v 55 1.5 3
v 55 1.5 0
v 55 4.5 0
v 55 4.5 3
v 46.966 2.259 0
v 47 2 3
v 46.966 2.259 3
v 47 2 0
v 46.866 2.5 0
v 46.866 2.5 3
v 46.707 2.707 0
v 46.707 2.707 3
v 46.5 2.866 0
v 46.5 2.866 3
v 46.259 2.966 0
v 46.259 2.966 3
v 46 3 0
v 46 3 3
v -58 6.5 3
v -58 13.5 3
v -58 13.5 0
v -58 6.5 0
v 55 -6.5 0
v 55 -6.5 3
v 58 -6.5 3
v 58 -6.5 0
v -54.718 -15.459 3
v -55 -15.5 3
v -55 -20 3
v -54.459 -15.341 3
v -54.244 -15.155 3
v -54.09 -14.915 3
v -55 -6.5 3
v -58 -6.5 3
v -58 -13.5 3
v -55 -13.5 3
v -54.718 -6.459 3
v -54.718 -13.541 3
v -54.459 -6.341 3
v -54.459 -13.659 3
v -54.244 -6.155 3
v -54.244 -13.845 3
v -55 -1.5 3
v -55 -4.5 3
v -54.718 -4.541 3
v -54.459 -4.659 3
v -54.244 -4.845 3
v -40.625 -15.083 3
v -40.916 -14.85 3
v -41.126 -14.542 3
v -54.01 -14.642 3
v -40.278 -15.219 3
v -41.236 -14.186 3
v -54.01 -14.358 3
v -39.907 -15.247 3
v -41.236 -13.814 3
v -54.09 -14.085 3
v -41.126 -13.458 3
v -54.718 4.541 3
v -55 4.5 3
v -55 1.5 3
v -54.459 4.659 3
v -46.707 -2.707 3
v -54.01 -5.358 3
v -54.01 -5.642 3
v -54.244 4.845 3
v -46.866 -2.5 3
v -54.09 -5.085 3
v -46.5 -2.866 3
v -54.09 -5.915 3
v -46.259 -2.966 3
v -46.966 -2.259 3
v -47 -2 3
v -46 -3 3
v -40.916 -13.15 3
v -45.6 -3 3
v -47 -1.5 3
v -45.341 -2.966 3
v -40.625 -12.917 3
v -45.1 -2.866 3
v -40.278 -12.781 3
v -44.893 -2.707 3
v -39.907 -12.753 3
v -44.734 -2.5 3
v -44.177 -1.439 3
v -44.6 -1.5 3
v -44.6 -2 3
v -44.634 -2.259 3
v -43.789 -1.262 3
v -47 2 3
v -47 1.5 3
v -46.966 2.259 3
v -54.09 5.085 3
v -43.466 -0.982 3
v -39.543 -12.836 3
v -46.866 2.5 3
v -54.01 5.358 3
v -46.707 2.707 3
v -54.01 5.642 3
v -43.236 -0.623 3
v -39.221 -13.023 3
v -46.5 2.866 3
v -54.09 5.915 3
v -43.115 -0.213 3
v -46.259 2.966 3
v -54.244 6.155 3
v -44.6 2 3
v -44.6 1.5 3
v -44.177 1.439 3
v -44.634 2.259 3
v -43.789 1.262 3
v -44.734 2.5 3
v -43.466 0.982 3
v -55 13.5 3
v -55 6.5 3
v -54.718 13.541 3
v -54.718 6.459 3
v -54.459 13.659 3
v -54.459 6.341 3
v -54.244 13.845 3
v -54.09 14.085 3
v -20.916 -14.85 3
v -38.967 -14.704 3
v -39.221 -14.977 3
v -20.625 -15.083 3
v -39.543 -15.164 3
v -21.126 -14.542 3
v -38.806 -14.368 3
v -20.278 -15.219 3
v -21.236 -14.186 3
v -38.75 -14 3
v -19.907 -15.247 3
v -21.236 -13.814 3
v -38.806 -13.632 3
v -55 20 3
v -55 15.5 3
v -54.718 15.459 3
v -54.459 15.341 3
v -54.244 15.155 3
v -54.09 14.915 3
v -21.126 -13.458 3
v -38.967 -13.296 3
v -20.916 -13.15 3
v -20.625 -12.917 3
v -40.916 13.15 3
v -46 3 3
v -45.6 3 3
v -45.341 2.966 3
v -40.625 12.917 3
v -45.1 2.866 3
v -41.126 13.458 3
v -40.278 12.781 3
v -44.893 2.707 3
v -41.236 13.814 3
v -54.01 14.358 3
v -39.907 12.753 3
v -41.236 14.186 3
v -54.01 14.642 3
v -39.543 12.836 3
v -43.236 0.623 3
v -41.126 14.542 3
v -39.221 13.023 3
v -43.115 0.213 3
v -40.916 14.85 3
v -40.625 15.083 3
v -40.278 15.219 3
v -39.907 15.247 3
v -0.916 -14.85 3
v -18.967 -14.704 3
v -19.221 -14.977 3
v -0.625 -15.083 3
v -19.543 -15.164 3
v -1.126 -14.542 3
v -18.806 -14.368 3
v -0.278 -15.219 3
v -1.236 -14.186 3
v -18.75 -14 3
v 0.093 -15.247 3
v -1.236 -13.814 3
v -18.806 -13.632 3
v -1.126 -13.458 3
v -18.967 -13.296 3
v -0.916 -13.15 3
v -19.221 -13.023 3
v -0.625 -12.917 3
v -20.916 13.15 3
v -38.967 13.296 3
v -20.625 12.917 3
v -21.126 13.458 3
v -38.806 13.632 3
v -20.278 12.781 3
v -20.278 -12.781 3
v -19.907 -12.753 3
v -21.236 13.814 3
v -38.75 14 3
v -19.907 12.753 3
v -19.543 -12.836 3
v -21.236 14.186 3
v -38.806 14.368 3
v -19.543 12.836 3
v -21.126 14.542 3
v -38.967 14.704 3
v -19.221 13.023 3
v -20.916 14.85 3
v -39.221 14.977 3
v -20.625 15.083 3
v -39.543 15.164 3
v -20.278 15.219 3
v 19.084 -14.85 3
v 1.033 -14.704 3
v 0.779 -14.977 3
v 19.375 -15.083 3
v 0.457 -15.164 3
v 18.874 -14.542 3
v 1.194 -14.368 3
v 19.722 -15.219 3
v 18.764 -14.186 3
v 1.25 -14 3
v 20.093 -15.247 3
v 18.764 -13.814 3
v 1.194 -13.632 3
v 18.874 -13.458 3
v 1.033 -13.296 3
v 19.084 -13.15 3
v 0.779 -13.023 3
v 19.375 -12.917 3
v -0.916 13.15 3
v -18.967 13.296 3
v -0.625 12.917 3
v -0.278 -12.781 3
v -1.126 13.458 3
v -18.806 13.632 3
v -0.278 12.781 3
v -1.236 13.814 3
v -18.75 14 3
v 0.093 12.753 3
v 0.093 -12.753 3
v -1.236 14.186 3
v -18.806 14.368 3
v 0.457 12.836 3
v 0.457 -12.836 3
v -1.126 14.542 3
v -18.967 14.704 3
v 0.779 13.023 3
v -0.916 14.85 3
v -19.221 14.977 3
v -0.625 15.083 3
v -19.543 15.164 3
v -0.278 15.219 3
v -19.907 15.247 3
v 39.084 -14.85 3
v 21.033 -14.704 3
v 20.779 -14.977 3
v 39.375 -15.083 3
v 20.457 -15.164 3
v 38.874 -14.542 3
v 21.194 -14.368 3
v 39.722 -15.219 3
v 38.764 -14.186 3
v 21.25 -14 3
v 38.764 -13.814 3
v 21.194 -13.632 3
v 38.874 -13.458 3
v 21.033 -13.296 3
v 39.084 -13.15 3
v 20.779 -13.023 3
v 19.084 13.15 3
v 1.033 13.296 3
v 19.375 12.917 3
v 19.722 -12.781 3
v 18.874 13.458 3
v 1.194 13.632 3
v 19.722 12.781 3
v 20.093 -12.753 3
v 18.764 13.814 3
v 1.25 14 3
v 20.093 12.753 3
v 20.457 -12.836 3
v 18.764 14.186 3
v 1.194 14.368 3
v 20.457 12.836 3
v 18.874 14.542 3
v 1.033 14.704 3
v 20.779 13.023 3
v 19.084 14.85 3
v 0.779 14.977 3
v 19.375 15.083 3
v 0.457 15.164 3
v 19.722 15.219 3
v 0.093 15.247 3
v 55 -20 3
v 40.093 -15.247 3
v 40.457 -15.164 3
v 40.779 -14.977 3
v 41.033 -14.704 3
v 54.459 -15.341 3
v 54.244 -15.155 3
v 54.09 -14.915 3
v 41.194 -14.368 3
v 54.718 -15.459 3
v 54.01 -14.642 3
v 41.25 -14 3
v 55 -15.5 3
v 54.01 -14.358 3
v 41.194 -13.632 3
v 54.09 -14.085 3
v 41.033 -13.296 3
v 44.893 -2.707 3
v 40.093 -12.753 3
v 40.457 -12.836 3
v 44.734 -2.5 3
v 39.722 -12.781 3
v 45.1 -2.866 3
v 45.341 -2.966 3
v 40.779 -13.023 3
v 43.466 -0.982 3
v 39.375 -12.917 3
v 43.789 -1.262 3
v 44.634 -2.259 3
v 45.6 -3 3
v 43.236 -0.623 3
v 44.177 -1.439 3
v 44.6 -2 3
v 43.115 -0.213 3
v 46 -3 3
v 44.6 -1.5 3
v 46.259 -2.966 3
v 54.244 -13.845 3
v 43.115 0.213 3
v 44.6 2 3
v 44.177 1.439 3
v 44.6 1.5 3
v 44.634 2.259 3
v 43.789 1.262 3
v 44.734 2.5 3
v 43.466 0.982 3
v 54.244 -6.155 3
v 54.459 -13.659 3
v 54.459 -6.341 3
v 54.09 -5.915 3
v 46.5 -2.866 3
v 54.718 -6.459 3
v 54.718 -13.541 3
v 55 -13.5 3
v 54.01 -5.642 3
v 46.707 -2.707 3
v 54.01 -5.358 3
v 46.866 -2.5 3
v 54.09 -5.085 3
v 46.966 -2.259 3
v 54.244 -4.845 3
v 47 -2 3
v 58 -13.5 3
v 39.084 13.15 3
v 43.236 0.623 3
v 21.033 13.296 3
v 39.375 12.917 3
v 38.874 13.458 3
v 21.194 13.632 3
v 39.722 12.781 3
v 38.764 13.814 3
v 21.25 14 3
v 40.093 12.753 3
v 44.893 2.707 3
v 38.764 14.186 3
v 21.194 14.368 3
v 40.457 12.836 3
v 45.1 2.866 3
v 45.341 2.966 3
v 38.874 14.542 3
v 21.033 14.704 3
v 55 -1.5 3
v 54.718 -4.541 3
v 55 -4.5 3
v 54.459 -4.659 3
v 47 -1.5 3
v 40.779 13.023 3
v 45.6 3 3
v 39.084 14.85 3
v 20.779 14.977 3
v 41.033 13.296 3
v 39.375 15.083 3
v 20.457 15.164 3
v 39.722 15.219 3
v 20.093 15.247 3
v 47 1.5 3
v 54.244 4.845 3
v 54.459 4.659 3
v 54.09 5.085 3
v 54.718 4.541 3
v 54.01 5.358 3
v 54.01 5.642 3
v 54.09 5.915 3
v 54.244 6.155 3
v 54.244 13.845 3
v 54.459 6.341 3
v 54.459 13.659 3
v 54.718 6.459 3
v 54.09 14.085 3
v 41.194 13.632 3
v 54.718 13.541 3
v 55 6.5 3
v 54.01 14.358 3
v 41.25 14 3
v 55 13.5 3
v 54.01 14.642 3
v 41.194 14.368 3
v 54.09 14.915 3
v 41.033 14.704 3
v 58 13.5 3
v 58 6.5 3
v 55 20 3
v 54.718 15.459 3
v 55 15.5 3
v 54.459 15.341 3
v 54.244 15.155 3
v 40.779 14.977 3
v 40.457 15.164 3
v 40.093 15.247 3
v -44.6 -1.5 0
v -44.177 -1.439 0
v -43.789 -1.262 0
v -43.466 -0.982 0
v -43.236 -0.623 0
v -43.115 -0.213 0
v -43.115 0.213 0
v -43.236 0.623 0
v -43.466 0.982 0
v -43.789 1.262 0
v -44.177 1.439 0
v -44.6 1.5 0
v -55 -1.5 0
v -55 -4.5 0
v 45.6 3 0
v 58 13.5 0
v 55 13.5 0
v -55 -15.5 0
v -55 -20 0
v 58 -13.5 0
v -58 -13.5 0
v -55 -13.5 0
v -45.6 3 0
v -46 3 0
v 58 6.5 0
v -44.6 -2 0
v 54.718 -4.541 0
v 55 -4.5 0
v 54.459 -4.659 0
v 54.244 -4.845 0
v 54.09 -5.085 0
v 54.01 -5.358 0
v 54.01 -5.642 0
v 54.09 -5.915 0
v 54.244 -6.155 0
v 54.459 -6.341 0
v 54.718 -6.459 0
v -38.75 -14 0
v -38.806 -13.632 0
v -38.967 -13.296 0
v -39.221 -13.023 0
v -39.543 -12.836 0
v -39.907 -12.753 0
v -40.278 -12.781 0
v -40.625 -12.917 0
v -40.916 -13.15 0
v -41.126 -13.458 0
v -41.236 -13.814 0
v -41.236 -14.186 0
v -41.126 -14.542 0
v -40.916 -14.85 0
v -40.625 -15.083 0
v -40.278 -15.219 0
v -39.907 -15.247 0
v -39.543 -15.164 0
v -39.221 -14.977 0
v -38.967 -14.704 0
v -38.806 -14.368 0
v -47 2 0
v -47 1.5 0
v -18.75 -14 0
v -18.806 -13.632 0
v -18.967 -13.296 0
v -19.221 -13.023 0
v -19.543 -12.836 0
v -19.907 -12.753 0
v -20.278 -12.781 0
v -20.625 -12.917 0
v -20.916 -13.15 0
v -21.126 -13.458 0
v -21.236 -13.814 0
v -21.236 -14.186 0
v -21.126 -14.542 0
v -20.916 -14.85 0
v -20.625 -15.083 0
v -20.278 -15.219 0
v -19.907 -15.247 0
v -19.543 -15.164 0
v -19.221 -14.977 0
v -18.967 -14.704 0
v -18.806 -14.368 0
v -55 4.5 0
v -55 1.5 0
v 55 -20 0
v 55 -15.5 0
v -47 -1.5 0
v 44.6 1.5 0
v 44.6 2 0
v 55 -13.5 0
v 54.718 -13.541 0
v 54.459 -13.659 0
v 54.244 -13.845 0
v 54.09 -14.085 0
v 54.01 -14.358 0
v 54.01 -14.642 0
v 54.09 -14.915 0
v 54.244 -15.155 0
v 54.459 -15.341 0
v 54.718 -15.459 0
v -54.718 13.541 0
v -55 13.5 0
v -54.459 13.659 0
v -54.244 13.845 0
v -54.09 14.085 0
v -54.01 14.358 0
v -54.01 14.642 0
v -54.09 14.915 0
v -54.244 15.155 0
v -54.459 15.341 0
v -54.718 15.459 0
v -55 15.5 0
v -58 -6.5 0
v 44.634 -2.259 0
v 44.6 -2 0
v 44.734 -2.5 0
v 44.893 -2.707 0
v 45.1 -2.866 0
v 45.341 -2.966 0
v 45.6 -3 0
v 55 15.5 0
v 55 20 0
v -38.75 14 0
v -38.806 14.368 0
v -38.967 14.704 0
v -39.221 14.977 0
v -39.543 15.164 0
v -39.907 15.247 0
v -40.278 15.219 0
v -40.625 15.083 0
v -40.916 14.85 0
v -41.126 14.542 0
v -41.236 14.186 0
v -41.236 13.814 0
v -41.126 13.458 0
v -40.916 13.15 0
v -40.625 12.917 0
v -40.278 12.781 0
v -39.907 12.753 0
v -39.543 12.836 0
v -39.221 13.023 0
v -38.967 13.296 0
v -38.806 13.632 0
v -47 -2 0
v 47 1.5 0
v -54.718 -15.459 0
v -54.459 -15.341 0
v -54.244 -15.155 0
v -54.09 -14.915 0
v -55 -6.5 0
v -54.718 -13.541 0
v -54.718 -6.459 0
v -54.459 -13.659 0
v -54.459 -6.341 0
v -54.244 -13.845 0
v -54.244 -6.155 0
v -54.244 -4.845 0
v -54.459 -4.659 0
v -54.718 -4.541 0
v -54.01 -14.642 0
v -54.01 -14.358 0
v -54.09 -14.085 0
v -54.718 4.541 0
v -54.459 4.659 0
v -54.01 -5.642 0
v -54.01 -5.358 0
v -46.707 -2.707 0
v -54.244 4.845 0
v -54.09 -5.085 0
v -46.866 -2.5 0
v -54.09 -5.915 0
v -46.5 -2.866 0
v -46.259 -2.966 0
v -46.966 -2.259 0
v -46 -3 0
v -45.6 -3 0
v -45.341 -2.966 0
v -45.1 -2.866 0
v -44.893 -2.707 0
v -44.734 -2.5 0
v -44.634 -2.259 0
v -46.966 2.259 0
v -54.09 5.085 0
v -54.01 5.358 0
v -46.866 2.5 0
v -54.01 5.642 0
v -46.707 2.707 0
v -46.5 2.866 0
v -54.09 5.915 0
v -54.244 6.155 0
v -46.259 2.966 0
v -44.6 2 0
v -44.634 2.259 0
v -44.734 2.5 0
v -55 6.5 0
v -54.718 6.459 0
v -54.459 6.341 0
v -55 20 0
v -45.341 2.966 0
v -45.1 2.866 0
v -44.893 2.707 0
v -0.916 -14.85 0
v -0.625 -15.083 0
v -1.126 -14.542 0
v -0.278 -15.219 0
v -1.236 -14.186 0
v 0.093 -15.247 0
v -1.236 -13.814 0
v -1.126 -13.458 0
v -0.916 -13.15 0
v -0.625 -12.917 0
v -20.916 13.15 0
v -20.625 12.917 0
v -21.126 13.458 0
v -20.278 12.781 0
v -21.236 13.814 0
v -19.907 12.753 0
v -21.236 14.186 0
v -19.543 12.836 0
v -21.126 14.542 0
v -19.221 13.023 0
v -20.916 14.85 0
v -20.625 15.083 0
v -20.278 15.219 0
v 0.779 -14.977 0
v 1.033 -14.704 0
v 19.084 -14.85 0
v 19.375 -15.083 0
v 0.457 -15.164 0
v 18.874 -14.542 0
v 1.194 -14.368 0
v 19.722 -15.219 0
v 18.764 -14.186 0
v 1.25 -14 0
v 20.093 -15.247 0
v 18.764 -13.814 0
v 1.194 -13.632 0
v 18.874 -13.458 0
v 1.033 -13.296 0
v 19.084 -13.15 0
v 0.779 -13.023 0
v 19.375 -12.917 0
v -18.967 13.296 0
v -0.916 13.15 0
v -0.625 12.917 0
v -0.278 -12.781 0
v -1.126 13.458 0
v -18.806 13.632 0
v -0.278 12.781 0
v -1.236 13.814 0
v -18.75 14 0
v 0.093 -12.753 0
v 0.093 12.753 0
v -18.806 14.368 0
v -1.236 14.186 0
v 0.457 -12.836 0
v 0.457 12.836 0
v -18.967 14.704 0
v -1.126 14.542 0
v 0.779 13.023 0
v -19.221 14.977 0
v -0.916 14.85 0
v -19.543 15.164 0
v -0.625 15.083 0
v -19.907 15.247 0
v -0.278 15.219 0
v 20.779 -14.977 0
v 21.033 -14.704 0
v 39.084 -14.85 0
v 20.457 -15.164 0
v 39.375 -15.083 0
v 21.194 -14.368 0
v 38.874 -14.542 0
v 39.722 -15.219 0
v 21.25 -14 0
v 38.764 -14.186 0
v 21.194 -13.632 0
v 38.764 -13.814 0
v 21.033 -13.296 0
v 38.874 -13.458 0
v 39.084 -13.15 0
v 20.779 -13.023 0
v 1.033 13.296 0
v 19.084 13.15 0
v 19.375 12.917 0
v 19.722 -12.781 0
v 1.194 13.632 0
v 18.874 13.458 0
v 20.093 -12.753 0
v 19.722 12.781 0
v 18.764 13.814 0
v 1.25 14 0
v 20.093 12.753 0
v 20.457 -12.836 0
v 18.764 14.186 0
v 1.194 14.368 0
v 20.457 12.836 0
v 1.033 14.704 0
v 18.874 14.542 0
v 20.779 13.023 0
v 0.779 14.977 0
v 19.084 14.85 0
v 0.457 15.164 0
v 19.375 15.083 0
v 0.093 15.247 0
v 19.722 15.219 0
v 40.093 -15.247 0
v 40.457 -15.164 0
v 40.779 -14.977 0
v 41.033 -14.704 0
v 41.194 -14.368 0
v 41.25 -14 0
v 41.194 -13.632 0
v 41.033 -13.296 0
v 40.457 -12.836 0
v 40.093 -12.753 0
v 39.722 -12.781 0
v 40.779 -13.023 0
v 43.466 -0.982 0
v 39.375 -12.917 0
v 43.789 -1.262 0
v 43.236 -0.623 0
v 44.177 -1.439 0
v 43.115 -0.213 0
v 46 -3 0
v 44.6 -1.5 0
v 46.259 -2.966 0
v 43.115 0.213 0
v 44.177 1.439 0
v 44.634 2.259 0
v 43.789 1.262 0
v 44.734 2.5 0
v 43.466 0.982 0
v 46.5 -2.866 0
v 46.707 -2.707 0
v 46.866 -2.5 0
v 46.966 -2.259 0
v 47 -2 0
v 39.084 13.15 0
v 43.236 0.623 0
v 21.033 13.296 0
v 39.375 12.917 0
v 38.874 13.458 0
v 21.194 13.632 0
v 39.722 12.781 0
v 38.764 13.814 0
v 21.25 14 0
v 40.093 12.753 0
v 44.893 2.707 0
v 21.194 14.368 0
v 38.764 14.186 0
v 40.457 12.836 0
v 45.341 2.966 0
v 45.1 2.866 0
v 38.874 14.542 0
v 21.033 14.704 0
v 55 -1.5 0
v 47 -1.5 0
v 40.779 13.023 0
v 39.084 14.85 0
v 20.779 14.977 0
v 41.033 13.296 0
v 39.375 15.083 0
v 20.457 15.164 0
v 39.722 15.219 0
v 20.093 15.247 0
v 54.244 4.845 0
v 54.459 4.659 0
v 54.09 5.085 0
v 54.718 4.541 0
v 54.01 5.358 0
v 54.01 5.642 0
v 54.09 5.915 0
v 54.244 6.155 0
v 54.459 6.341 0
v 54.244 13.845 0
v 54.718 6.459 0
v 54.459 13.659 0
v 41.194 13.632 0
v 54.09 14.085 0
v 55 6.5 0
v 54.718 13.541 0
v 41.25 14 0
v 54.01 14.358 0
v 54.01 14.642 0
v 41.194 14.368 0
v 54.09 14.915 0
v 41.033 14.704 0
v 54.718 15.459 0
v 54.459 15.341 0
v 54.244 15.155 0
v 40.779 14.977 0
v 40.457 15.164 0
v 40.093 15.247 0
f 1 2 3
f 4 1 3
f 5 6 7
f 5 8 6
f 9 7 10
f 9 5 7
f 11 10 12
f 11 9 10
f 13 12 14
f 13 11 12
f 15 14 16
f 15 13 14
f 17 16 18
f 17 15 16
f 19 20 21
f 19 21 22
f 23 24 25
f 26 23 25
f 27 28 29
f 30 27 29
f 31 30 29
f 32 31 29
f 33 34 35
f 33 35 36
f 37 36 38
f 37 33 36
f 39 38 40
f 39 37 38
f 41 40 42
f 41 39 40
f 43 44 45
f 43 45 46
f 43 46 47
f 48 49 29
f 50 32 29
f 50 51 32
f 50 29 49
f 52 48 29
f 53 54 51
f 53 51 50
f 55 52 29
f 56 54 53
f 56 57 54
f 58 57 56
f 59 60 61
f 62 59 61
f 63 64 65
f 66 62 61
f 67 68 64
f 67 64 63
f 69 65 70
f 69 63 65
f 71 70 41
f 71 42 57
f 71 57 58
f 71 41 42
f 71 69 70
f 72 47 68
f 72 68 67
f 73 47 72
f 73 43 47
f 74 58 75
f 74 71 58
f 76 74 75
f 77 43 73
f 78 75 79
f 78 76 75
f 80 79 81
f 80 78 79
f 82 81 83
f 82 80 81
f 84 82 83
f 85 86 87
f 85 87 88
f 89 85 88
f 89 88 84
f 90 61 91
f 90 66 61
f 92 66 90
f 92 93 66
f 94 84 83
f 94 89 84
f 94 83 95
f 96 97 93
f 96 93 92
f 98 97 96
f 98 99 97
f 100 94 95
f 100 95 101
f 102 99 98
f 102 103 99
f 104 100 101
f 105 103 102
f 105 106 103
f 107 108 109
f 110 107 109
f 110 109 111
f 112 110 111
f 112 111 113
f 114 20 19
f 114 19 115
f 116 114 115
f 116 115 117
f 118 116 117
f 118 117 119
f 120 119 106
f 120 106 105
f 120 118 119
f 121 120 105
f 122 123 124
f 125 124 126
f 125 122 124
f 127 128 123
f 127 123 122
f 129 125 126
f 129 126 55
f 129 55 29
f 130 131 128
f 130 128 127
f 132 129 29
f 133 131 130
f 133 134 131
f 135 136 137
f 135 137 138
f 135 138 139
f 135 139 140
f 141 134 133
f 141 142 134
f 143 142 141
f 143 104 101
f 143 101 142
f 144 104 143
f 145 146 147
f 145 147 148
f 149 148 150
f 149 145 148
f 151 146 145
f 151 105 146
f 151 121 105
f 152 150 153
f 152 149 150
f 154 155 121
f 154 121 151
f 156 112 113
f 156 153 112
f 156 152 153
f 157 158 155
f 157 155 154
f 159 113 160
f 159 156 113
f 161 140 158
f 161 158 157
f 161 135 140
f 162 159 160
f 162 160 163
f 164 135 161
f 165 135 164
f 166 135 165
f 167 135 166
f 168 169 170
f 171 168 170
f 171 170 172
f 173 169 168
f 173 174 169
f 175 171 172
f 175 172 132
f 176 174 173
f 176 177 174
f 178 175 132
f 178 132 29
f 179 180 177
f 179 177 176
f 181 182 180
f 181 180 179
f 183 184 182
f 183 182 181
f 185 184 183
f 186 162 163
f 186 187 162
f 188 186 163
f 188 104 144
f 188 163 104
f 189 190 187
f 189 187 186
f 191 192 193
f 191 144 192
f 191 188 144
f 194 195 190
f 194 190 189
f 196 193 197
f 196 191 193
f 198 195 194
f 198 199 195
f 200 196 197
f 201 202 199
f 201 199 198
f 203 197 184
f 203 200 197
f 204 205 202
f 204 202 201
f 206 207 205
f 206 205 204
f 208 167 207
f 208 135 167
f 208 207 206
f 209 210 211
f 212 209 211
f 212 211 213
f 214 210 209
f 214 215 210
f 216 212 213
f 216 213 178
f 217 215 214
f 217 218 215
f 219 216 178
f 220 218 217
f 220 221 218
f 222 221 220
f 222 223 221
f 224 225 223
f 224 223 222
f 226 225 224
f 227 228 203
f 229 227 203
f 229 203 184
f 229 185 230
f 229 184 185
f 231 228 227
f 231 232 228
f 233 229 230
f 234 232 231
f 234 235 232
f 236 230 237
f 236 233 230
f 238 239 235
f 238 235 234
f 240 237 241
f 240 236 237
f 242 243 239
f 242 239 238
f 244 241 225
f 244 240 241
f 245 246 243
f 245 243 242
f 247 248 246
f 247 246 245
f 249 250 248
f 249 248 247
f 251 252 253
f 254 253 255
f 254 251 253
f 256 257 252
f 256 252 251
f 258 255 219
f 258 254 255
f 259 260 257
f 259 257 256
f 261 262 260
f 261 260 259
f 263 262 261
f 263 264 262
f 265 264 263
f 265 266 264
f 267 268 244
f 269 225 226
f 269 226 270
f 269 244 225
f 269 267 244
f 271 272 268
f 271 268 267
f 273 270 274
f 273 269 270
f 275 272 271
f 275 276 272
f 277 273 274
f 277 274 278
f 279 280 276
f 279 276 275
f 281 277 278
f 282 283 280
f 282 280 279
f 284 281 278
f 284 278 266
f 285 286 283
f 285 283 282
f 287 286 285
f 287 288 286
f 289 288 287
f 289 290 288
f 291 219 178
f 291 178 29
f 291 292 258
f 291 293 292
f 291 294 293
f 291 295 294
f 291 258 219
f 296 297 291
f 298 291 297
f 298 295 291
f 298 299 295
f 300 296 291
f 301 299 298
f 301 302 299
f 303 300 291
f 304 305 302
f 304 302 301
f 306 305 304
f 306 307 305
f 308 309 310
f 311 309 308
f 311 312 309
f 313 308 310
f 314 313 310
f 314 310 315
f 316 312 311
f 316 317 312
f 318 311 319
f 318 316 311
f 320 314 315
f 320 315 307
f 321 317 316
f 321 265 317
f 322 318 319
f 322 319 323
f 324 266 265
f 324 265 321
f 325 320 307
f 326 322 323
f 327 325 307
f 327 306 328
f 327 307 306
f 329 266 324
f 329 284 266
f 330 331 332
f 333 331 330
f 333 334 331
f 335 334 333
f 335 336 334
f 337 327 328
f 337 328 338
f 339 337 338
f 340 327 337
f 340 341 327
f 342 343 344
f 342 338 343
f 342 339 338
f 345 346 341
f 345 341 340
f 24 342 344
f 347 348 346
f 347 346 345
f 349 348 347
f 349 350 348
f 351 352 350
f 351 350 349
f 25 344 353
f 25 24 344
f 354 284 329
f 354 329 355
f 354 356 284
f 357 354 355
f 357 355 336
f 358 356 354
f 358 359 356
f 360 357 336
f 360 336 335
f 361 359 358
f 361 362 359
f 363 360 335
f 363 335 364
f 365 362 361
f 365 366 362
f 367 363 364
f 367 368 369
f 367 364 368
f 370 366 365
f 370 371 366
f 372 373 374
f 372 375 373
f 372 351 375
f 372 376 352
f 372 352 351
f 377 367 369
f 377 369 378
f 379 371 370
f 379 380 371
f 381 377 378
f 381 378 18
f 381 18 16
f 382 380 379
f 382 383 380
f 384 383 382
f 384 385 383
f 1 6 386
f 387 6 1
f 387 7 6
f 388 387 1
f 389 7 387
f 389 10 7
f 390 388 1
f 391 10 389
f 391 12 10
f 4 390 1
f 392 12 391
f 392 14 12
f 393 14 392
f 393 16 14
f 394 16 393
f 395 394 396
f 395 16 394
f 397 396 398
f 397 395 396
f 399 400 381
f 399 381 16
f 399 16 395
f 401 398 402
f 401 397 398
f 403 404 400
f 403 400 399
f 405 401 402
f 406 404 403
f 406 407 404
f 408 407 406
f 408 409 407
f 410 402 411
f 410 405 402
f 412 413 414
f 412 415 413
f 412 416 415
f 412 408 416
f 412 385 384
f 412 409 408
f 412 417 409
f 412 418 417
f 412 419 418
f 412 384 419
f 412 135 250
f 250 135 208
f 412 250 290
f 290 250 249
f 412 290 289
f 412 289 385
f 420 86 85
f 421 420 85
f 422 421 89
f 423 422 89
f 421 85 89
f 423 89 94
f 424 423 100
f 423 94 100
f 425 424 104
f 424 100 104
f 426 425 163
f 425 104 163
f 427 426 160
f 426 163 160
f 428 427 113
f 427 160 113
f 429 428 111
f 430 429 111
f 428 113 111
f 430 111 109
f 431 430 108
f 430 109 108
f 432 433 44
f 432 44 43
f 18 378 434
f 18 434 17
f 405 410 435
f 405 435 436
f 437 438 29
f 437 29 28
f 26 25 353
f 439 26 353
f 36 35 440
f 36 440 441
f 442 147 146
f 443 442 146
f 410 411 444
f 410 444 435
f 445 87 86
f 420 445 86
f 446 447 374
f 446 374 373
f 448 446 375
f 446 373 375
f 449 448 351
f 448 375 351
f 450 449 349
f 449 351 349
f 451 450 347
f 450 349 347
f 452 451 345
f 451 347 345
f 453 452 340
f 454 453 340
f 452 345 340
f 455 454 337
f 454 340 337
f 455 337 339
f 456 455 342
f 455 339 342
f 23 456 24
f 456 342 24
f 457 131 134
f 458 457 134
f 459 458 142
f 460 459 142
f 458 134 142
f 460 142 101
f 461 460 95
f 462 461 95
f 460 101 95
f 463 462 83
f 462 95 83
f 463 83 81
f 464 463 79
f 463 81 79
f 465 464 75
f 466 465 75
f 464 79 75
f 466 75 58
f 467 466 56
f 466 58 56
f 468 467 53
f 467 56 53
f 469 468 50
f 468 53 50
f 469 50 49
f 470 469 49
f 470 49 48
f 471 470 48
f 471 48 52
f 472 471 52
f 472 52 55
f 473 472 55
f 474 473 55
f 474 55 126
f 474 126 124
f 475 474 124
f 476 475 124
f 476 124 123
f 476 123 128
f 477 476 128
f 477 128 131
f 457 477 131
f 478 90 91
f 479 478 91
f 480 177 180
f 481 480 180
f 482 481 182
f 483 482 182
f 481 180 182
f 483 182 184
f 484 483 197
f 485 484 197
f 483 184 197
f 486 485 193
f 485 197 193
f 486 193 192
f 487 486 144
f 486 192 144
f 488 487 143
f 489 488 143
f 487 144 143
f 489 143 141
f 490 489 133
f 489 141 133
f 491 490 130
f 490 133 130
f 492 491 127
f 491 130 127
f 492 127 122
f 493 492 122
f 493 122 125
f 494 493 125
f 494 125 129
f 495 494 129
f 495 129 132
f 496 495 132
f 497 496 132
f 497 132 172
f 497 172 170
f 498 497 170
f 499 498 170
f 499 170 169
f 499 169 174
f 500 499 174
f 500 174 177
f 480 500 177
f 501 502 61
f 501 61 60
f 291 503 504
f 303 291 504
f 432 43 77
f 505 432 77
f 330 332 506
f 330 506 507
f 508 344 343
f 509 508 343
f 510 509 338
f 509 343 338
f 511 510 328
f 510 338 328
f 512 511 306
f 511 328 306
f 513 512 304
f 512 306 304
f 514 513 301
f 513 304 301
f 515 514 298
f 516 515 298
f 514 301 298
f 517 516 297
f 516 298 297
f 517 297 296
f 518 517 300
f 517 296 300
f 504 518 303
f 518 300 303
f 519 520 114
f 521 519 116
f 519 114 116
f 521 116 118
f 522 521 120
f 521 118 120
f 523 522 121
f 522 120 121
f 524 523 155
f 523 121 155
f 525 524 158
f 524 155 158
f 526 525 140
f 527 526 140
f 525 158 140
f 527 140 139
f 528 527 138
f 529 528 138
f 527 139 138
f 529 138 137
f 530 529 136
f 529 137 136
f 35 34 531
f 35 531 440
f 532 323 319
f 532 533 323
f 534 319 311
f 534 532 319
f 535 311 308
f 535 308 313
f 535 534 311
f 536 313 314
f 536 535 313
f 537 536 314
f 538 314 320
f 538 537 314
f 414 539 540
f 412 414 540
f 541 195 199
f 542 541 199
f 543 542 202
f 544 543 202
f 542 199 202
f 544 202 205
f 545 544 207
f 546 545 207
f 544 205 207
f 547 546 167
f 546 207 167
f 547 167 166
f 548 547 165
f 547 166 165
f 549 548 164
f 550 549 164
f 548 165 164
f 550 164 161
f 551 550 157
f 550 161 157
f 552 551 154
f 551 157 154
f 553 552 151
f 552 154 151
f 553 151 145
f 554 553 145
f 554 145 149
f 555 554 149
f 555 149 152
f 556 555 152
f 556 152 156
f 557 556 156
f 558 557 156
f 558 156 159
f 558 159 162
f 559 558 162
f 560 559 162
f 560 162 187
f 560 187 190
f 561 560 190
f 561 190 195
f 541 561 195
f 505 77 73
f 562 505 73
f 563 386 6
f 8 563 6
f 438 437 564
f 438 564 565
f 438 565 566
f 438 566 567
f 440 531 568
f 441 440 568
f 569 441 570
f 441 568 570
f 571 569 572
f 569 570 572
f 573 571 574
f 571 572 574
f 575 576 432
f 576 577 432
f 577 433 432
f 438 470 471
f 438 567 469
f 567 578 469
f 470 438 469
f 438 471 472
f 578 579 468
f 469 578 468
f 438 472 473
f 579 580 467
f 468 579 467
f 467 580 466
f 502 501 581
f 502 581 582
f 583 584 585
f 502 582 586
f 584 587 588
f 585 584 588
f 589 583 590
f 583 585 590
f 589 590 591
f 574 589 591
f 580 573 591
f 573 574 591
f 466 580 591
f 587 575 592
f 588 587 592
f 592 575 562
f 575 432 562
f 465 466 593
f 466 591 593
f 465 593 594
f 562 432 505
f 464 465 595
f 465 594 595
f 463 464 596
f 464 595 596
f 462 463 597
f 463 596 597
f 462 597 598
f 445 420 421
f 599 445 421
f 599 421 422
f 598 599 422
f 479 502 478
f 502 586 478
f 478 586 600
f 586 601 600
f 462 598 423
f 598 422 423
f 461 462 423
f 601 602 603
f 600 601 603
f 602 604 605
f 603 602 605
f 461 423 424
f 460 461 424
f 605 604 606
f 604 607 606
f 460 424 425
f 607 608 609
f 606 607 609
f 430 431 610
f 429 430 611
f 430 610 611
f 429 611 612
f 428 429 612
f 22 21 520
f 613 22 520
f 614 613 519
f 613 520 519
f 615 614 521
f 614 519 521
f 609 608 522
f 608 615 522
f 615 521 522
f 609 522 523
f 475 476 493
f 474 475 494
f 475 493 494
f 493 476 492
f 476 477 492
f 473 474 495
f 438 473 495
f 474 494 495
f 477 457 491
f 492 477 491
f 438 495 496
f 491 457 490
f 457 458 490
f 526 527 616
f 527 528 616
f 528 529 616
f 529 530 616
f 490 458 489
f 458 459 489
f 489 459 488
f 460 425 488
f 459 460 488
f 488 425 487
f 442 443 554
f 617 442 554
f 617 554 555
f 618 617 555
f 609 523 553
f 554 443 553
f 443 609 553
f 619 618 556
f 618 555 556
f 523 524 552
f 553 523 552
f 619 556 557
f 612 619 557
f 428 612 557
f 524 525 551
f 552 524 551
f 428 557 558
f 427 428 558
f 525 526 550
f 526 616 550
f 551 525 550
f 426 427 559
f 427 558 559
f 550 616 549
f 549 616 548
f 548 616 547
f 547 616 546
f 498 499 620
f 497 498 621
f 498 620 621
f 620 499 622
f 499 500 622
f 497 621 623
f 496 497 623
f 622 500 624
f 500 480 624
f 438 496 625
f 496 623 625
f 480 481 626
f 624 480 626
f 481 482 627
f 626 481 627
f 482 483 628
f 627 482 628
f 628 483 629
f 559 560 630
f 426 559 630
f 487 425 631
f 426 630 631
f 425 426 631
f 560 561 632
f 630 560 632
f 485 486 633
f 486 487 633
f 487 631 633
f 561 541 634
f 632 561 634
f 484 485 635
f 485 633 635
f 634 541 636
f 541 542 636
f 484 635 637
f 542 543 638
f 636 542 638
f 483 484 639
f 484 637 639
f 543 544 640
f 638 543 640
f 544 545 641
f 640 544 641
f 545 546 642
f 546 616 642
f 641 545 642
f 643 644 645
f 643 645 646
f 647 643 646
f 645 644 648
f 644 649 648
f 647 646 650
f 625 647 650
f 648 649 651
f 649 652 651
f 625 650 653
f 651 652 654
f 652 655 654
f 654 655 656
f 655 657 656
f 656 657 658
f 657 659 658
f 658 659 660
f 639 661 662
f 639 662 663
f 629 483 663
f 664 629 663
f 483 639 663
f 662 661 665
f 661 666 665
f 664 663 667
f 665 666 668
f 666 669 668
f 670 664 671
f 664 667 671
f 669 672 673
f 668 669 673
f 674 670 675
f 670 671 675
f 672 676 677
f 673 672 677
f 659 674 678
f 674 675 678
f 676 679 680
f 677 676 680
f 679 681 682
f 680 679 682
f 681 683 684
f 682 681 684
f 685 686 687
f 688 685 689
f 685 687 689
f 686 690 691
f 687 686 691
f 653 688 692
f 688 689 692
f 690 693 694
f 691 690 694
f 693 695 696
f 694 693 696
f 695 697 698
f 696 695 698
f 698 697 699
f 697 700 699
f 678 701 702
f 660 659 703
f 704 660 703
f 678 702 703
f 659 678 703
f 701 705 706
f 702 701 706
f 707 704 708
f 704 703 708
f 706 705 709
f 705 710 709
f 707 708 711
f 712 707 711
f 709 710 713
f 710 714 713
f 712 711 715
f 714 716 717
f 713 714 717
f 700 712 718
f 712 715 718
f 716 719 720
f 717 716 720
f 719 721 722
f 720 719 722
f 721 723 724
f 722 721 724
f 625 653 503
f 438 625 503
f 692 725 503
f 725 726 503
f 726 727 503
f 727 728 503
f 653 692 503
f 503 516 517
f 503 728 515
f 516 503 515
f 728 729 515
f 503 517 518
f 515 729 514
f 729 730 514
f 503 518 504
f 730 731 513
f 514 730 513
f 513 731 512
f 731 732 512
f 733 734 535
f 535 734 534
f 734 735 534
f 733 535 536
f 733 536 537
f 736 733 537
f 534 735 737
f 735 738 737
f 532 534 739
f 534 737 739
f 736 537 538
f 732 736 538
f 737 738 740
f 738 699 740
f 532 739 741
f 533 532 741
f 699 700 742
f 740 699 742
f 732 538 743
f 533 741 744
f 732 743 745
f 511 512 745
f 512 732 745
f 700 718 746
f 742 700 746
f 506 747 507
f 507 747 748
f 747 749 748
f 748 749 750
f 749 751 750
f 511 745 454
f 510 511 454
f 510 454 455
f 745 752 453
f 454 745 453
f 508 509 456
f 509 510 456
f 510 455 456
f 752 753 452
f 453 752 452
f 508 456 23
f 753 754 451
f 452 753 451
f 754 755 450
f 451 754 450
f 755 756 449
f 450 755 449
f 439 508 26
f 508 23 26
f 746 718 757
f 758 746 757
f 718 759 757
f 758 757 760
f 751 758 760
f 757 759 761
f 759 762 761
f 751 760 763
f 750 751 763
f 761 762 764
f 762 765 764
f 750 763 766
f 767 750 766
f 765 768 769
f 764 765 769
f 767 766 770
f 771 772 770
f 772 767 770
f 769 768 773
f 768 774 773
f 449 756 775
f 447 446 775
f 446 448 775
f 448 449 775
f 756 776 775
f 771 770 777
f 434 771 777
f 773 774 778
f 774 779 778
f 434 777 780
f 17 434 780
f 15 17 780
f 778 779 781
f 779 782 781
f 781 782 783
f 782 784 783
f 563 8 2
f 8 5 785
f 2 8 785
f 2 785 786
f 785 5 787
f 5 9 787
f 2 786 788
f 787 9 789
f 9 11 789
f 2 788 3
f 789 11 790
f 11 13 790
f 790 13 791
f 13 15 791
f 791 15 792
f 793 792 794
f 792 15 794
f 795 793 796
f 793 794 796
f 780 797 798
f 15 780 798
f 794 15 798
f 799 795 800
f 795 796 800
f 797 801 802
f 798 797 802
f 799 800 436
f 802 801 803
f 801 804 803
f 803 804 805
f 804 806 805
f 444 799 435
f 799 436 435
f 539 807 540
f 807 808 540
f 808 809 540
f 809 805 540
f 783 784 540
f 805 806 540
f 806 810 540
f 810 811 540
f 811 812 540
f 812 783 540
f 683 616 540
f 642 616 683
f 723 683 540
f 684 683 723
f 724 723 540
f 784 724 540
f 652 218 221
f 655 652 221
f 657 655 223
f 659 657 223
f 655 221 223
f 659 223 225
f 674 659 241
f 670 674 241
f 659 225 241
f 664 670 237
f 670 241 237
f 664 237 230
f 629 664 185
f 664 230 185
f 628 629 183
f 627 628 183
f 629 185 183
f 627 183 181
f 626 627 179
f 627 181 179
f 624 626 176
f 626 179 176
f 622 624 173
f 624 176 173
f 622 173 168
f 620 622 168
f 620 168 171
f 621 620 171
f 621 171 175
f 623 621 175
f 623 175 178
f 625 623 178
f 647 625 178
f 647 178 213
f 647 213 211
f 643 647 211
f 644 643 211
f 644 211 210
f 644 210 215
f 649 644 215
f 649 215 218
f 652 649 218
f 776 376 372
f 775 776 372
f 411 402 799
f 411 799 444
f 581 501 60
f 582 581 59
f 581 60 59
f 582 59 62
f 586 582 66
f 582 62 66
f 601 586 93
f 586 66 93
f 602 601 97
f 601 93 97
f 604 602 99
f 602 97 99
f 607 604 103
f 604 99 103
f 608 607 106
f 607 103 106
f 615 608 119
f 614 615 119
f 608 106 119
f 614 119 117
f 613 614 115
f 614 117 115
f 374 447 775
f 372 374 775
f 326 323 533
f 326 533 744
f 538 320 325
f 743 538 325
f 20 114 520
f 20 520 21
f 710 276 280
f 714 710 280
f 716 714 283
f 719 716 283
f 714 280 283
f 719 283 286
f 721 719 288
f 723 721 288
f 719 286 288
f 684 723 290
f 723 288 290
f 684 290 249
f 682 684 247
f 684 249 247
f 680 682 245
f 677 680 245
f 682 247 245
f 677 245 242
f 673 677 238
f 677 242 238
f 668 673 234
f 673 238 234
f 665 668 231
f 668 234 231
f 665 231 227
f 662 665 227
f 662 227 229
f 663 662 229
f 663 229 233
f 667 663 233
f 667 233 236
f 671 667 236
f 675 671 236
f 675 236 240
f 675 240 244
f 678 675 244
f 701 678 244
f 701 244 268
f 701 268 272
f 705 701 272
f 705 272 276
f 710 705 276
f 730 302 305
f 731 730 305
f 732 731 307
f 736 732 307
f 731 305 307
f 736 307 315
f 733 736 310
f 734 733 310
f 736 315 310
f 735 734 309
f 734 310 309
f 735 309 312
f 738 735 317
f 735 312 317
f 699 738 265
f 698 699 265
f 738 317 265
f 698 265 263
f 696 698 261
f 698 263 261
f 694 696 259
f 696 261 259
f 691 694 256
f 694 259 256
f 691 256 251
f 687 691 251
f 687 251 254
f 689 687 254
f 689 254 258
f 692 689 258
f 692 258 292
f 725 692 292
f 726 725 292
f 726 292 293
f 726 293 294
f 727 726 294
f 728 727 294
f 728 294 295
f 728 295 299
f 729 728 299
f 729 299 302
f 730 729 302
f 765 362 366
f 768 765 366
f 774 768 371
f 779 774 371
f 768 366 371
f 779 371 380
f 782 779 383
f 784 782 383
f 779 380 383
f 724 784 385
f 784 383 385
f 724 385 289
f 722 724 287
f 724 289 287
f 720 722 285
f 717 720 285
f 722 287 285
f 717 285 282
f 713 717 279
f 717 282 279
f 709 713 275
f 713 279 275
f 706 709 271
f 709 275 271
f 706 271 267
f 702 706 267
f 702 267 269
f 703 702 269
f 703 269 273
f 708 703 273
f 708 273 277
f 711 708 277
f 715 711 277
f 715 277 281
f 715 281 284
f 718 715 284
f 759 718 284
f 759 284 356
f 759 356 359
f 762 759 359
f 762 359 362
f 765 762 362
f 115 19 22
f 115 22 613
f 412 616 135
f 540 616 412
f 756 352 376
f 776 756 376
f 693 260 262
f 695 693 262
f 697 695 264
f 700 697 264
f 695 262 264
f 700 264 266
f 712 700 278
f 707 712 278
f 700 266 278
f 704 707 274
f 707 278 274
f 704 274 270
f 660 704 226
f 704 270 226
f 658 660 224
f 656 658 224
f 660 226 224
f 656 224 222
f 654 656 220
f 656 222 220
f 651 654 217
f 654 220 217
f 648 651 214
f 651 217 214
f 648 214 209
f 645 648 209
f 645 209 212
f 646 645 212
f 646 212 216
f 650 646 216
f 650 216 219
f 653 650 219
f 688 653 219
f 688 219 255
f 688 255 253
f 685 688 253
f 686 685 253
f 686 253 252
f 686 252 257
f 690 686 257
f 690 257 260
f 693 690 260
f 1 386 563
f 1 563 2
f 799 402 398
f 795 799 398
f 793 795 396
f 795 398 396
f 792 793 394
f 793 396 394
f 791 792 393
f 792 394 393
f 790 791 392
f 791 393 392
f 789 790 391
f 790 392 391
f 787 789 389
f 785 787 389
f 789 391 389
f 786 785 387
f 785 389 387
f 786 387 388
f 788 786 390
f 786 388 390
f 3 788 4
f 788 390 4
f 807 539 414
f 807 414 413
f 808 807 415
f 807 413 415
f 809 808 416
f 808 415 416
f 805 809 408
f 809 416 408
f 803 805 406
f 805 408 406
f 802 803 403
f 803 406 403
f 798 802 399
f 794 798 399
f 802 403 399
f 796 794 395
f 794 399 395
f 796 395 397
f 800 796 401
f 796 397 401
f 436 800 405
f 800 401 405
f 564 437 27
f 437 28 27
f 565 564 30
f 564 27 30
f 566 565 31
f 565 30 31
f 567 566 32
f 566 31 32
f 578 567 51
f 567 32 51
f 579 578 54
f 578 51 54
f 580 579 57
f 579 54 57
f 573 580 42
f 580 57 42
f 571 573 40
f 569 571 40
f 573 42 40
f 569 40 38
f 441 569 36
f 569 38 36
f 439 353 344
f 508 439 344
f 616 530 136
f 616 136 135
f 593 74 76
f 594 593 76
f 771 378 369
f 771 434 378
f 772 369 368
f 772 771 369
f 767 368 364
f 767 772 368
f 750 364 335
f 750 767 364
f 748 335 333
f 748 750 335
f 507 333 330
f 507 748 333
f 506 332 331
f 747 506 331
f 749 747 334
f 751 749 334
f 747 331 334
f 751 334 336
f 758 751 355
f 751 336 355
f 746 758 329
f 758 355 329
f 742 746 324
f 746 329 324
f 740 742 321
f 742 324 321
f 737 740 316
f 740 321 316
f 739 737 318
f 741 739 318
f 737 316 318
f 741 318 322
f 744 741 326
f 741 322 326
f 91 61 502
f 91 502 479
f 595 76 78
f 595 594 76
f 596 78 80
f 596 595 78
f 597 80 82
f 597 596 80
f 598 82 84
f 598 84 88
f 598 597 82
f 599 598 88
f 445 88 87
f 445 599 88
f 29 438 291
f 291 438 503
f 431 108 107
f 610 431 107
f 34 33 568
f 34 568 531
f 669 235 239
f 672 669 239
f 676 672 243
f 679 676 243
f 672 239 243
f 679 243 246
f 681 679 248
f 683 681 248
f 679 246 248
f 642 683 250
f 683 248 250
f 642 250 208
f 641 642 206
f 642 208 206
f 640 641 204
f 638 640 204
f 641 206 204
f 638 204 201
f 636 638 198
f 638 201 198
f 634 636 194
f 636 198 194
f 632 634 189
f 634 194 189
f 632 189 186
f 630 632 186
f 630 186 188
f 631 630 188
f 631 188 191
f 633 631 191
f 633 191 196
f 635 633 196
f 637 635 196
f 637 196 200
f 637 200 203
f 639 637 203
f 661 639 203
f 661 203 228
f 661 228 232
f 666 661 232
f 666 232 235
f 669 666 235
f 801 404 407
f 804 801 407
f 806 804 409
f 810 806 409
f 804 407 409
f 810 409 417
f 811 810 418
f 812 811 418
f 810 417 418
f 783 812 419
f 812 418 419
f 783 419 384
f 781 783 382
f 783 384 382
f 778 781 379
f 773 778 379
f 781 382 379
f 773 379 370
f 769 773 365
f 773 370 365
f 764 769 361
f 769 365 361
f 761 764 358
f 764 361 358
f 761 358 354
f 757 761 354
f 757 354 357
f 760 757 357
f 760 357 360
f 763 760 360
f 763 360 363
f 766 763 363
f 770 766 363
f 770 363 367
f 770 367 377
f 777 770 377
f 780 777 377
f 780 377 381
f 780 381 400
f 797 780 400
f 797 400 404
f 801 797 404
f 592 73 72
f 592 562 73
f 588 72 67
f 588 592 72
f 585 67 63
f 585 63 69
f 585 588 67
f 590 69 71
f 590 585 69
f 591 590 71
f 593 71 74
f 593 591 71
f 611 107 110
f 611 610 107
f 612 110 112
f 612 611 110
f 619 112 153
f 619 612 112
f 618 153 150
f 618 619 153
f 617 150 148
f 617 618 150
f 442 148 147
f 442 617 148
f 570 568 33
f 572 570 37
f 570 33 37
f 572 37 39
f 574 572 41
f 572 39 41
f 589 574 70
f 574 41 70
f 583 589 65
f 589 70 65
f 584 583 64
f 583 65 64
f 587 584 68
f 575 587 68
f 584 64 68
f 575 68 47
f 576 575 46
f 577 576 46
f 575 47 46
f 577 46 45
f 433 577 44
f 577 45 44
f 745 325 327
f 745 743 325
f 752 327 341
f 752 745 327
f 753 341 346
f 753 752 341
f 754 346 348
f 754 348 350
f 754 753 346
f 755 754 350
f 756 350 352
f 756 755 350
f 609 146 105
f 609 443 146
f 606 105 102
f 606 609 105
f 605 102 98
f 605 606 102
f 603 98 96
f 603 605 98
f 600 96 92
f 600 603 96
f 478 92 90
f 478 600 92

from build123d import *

# Parameters (mm, degrees)
SKETCH1_W           = 110
SKETCH1_H           = 40
BOSS_EXTRUDE1_DEPTH = 3
BOSS_EXTRUDE2_DEPTH = 3
SKETCH3_R           = 1
CUT_EXTRUDE1_DEPTH  = 3
SKETCH4_W           = 8
SKETCH4_H           = 3
SKETCH4_W_2         = 2.4
SKETCH4_H_2         = 6
CUT_EXTRUDE2_DEPTH  = 3
FILLET6_R           = 1
SKETCH6_R           = 1.25
CUT_EXTRUDE4_DEPTH  = 62.424750712


with BuildPart() as part:
    # Sketch1 → Boss-Extrude1 (new body)
    with BuildSketch(Plane.XY):
        Rectangle(SKETCH1_W, SKETCH1_H)
    extrude(amount=BOSS_EXTRUDE1_DEPTH)

    # Sketch2 → Boss-Extrude2 (add)
    with BuildSketch(Plane.XY.offset(3)):
        Polygon((58, 10), (58, 13.5), (55, 13.5), (55, 6.5), (58, 6.5), align=None)
        Polygon((55, -10), (55, -6.5), (58, -6.5), (58, -13.5), (55, -13.5), align=None)
        Polygon((-55, 6.5), (-55, 13.5), (-58, 13.5), (-58, 10), (-58, 6.5), align=None)
        Polygon((-55, -13.5), (-55, -10), (-55, -6.5), (-58, -6.5), (-58, -13.5), align=None)
    extrude(amount=-BOSS_EXTRUDE2_DEPTH)

    # Sketch3 → Cut-Extrude1 (cut)
    with BuildSketch(Plane.XY.offset(3)):
        with Locations((-55, 14.5)):
            Circle(SKETCH3_R)
        with Locations((-55, 5.5)):
            Circle(SKETCH3_R)
        with Locations((-55, -5.5)):
            Circle(SKETCH3_R)
        with Locations((-55, -14.5)):
            Circle(SKETCH3_R)
        with Locations((55, 14.5)):
            Circle(SKETCH3_R)
        with Locations((55, 5.5)):
            Circle(SKETCH3_R)
        with Locations((55, -5.5)):
            Circle(SKETCH3_R)
        with Locations((55, -14.5)):
            Circle(SKETCH3_R)
    extrude(amount=-CUT_EXTRUDE1_DEPTH, mode=Mode.SUBTRACT)

    # Sketch4 → Cut-Extrude2 (cut)
    with BuildSketch(Plane.XY.offset(3)):
        with Locations((-51, 0)):
            Rectangle(SKETCH4_W, SKETCH4_H)
        Polygon((-47, 3), (-47, 1.5), (-47, -1.5), (-47, -3), (-44.6, -3), (-44.6, -1.5), (-44.6, 1.5), (-44.6, 3), align=None)
        with BuildLine():
            ThreePointArc((-44.6, -1.5), (-43.1, 0), (-44.6, 1.5))
            Line((-44.6, 1.5), (-44.6, -1.5))
        make_face()
        with Locations((45.8, 0)):
            Rectangle(SKETCH4_W_2, SKETCH4_H_2)
        with BuildLine():
            Line((44.6, -1.5), (44.6, 1.5))
            ThreePointArc((44.6, 1.5), (43.1, 0), (44.6, -1.5))
        make_face()
        with Locations((51, 0)):
            Rectangle(SKETCH4_W, SKETCH4_H)
    extrude(amount=-CUT_EXTRUDE2_DEPTH, mode=Mode.SUBTRACT)

    # Fillet6
    fillet6_edges = [part.edges().sort_by_distance(p)[0] for p in [
        (-47, 3, 1.5),
        (-44.6, 3, 1.5),
        (-44.6, -3, 1.5),
        (-47, -3, 1.5),
        (47, 3, 1.5),
        (47, -3, 1.5),
        (44.6, -3, 1.5),
        (44.6, 3, 1.5),
    ]]
    fillet(fillet6_edges, radius=FILLET6_R)

    # Sketch6 → Cut-Extrude4 (cut, through all)
    with BuildSketch(Plane.XY.offset(3)):
        with Locations((-40, -14)):
            Circle(SKETCH6_R)
        with Locations((-20, -14)):
            Circle(SKETCH6_R)
        with Locations((0, -14)):
            Circle(SKETCH6_R)
        with Locations((20, -14)):
            Circle(SKETCH6_R)
        with Locations((40, -14)):
            Circle(SKETCH6_R)
        with Locations((40, 14)):
            Circle(SKETCH6_R)
        with Locations((20, 14)):
            Circle(SKETCH6_R)
        with Locations((0, 14)):
            Circle(SKETCH6_R)
        with Locations((-20, 14)):
            Circle(SKETCH6_R)
        with Locations((-40, 14)):
            Circle(SKETCH6_R)
    extrude(amount=-CUT_EXTRUDE4_DEPTH, mode=Mode.SUBTRACT)


solid = part.part
